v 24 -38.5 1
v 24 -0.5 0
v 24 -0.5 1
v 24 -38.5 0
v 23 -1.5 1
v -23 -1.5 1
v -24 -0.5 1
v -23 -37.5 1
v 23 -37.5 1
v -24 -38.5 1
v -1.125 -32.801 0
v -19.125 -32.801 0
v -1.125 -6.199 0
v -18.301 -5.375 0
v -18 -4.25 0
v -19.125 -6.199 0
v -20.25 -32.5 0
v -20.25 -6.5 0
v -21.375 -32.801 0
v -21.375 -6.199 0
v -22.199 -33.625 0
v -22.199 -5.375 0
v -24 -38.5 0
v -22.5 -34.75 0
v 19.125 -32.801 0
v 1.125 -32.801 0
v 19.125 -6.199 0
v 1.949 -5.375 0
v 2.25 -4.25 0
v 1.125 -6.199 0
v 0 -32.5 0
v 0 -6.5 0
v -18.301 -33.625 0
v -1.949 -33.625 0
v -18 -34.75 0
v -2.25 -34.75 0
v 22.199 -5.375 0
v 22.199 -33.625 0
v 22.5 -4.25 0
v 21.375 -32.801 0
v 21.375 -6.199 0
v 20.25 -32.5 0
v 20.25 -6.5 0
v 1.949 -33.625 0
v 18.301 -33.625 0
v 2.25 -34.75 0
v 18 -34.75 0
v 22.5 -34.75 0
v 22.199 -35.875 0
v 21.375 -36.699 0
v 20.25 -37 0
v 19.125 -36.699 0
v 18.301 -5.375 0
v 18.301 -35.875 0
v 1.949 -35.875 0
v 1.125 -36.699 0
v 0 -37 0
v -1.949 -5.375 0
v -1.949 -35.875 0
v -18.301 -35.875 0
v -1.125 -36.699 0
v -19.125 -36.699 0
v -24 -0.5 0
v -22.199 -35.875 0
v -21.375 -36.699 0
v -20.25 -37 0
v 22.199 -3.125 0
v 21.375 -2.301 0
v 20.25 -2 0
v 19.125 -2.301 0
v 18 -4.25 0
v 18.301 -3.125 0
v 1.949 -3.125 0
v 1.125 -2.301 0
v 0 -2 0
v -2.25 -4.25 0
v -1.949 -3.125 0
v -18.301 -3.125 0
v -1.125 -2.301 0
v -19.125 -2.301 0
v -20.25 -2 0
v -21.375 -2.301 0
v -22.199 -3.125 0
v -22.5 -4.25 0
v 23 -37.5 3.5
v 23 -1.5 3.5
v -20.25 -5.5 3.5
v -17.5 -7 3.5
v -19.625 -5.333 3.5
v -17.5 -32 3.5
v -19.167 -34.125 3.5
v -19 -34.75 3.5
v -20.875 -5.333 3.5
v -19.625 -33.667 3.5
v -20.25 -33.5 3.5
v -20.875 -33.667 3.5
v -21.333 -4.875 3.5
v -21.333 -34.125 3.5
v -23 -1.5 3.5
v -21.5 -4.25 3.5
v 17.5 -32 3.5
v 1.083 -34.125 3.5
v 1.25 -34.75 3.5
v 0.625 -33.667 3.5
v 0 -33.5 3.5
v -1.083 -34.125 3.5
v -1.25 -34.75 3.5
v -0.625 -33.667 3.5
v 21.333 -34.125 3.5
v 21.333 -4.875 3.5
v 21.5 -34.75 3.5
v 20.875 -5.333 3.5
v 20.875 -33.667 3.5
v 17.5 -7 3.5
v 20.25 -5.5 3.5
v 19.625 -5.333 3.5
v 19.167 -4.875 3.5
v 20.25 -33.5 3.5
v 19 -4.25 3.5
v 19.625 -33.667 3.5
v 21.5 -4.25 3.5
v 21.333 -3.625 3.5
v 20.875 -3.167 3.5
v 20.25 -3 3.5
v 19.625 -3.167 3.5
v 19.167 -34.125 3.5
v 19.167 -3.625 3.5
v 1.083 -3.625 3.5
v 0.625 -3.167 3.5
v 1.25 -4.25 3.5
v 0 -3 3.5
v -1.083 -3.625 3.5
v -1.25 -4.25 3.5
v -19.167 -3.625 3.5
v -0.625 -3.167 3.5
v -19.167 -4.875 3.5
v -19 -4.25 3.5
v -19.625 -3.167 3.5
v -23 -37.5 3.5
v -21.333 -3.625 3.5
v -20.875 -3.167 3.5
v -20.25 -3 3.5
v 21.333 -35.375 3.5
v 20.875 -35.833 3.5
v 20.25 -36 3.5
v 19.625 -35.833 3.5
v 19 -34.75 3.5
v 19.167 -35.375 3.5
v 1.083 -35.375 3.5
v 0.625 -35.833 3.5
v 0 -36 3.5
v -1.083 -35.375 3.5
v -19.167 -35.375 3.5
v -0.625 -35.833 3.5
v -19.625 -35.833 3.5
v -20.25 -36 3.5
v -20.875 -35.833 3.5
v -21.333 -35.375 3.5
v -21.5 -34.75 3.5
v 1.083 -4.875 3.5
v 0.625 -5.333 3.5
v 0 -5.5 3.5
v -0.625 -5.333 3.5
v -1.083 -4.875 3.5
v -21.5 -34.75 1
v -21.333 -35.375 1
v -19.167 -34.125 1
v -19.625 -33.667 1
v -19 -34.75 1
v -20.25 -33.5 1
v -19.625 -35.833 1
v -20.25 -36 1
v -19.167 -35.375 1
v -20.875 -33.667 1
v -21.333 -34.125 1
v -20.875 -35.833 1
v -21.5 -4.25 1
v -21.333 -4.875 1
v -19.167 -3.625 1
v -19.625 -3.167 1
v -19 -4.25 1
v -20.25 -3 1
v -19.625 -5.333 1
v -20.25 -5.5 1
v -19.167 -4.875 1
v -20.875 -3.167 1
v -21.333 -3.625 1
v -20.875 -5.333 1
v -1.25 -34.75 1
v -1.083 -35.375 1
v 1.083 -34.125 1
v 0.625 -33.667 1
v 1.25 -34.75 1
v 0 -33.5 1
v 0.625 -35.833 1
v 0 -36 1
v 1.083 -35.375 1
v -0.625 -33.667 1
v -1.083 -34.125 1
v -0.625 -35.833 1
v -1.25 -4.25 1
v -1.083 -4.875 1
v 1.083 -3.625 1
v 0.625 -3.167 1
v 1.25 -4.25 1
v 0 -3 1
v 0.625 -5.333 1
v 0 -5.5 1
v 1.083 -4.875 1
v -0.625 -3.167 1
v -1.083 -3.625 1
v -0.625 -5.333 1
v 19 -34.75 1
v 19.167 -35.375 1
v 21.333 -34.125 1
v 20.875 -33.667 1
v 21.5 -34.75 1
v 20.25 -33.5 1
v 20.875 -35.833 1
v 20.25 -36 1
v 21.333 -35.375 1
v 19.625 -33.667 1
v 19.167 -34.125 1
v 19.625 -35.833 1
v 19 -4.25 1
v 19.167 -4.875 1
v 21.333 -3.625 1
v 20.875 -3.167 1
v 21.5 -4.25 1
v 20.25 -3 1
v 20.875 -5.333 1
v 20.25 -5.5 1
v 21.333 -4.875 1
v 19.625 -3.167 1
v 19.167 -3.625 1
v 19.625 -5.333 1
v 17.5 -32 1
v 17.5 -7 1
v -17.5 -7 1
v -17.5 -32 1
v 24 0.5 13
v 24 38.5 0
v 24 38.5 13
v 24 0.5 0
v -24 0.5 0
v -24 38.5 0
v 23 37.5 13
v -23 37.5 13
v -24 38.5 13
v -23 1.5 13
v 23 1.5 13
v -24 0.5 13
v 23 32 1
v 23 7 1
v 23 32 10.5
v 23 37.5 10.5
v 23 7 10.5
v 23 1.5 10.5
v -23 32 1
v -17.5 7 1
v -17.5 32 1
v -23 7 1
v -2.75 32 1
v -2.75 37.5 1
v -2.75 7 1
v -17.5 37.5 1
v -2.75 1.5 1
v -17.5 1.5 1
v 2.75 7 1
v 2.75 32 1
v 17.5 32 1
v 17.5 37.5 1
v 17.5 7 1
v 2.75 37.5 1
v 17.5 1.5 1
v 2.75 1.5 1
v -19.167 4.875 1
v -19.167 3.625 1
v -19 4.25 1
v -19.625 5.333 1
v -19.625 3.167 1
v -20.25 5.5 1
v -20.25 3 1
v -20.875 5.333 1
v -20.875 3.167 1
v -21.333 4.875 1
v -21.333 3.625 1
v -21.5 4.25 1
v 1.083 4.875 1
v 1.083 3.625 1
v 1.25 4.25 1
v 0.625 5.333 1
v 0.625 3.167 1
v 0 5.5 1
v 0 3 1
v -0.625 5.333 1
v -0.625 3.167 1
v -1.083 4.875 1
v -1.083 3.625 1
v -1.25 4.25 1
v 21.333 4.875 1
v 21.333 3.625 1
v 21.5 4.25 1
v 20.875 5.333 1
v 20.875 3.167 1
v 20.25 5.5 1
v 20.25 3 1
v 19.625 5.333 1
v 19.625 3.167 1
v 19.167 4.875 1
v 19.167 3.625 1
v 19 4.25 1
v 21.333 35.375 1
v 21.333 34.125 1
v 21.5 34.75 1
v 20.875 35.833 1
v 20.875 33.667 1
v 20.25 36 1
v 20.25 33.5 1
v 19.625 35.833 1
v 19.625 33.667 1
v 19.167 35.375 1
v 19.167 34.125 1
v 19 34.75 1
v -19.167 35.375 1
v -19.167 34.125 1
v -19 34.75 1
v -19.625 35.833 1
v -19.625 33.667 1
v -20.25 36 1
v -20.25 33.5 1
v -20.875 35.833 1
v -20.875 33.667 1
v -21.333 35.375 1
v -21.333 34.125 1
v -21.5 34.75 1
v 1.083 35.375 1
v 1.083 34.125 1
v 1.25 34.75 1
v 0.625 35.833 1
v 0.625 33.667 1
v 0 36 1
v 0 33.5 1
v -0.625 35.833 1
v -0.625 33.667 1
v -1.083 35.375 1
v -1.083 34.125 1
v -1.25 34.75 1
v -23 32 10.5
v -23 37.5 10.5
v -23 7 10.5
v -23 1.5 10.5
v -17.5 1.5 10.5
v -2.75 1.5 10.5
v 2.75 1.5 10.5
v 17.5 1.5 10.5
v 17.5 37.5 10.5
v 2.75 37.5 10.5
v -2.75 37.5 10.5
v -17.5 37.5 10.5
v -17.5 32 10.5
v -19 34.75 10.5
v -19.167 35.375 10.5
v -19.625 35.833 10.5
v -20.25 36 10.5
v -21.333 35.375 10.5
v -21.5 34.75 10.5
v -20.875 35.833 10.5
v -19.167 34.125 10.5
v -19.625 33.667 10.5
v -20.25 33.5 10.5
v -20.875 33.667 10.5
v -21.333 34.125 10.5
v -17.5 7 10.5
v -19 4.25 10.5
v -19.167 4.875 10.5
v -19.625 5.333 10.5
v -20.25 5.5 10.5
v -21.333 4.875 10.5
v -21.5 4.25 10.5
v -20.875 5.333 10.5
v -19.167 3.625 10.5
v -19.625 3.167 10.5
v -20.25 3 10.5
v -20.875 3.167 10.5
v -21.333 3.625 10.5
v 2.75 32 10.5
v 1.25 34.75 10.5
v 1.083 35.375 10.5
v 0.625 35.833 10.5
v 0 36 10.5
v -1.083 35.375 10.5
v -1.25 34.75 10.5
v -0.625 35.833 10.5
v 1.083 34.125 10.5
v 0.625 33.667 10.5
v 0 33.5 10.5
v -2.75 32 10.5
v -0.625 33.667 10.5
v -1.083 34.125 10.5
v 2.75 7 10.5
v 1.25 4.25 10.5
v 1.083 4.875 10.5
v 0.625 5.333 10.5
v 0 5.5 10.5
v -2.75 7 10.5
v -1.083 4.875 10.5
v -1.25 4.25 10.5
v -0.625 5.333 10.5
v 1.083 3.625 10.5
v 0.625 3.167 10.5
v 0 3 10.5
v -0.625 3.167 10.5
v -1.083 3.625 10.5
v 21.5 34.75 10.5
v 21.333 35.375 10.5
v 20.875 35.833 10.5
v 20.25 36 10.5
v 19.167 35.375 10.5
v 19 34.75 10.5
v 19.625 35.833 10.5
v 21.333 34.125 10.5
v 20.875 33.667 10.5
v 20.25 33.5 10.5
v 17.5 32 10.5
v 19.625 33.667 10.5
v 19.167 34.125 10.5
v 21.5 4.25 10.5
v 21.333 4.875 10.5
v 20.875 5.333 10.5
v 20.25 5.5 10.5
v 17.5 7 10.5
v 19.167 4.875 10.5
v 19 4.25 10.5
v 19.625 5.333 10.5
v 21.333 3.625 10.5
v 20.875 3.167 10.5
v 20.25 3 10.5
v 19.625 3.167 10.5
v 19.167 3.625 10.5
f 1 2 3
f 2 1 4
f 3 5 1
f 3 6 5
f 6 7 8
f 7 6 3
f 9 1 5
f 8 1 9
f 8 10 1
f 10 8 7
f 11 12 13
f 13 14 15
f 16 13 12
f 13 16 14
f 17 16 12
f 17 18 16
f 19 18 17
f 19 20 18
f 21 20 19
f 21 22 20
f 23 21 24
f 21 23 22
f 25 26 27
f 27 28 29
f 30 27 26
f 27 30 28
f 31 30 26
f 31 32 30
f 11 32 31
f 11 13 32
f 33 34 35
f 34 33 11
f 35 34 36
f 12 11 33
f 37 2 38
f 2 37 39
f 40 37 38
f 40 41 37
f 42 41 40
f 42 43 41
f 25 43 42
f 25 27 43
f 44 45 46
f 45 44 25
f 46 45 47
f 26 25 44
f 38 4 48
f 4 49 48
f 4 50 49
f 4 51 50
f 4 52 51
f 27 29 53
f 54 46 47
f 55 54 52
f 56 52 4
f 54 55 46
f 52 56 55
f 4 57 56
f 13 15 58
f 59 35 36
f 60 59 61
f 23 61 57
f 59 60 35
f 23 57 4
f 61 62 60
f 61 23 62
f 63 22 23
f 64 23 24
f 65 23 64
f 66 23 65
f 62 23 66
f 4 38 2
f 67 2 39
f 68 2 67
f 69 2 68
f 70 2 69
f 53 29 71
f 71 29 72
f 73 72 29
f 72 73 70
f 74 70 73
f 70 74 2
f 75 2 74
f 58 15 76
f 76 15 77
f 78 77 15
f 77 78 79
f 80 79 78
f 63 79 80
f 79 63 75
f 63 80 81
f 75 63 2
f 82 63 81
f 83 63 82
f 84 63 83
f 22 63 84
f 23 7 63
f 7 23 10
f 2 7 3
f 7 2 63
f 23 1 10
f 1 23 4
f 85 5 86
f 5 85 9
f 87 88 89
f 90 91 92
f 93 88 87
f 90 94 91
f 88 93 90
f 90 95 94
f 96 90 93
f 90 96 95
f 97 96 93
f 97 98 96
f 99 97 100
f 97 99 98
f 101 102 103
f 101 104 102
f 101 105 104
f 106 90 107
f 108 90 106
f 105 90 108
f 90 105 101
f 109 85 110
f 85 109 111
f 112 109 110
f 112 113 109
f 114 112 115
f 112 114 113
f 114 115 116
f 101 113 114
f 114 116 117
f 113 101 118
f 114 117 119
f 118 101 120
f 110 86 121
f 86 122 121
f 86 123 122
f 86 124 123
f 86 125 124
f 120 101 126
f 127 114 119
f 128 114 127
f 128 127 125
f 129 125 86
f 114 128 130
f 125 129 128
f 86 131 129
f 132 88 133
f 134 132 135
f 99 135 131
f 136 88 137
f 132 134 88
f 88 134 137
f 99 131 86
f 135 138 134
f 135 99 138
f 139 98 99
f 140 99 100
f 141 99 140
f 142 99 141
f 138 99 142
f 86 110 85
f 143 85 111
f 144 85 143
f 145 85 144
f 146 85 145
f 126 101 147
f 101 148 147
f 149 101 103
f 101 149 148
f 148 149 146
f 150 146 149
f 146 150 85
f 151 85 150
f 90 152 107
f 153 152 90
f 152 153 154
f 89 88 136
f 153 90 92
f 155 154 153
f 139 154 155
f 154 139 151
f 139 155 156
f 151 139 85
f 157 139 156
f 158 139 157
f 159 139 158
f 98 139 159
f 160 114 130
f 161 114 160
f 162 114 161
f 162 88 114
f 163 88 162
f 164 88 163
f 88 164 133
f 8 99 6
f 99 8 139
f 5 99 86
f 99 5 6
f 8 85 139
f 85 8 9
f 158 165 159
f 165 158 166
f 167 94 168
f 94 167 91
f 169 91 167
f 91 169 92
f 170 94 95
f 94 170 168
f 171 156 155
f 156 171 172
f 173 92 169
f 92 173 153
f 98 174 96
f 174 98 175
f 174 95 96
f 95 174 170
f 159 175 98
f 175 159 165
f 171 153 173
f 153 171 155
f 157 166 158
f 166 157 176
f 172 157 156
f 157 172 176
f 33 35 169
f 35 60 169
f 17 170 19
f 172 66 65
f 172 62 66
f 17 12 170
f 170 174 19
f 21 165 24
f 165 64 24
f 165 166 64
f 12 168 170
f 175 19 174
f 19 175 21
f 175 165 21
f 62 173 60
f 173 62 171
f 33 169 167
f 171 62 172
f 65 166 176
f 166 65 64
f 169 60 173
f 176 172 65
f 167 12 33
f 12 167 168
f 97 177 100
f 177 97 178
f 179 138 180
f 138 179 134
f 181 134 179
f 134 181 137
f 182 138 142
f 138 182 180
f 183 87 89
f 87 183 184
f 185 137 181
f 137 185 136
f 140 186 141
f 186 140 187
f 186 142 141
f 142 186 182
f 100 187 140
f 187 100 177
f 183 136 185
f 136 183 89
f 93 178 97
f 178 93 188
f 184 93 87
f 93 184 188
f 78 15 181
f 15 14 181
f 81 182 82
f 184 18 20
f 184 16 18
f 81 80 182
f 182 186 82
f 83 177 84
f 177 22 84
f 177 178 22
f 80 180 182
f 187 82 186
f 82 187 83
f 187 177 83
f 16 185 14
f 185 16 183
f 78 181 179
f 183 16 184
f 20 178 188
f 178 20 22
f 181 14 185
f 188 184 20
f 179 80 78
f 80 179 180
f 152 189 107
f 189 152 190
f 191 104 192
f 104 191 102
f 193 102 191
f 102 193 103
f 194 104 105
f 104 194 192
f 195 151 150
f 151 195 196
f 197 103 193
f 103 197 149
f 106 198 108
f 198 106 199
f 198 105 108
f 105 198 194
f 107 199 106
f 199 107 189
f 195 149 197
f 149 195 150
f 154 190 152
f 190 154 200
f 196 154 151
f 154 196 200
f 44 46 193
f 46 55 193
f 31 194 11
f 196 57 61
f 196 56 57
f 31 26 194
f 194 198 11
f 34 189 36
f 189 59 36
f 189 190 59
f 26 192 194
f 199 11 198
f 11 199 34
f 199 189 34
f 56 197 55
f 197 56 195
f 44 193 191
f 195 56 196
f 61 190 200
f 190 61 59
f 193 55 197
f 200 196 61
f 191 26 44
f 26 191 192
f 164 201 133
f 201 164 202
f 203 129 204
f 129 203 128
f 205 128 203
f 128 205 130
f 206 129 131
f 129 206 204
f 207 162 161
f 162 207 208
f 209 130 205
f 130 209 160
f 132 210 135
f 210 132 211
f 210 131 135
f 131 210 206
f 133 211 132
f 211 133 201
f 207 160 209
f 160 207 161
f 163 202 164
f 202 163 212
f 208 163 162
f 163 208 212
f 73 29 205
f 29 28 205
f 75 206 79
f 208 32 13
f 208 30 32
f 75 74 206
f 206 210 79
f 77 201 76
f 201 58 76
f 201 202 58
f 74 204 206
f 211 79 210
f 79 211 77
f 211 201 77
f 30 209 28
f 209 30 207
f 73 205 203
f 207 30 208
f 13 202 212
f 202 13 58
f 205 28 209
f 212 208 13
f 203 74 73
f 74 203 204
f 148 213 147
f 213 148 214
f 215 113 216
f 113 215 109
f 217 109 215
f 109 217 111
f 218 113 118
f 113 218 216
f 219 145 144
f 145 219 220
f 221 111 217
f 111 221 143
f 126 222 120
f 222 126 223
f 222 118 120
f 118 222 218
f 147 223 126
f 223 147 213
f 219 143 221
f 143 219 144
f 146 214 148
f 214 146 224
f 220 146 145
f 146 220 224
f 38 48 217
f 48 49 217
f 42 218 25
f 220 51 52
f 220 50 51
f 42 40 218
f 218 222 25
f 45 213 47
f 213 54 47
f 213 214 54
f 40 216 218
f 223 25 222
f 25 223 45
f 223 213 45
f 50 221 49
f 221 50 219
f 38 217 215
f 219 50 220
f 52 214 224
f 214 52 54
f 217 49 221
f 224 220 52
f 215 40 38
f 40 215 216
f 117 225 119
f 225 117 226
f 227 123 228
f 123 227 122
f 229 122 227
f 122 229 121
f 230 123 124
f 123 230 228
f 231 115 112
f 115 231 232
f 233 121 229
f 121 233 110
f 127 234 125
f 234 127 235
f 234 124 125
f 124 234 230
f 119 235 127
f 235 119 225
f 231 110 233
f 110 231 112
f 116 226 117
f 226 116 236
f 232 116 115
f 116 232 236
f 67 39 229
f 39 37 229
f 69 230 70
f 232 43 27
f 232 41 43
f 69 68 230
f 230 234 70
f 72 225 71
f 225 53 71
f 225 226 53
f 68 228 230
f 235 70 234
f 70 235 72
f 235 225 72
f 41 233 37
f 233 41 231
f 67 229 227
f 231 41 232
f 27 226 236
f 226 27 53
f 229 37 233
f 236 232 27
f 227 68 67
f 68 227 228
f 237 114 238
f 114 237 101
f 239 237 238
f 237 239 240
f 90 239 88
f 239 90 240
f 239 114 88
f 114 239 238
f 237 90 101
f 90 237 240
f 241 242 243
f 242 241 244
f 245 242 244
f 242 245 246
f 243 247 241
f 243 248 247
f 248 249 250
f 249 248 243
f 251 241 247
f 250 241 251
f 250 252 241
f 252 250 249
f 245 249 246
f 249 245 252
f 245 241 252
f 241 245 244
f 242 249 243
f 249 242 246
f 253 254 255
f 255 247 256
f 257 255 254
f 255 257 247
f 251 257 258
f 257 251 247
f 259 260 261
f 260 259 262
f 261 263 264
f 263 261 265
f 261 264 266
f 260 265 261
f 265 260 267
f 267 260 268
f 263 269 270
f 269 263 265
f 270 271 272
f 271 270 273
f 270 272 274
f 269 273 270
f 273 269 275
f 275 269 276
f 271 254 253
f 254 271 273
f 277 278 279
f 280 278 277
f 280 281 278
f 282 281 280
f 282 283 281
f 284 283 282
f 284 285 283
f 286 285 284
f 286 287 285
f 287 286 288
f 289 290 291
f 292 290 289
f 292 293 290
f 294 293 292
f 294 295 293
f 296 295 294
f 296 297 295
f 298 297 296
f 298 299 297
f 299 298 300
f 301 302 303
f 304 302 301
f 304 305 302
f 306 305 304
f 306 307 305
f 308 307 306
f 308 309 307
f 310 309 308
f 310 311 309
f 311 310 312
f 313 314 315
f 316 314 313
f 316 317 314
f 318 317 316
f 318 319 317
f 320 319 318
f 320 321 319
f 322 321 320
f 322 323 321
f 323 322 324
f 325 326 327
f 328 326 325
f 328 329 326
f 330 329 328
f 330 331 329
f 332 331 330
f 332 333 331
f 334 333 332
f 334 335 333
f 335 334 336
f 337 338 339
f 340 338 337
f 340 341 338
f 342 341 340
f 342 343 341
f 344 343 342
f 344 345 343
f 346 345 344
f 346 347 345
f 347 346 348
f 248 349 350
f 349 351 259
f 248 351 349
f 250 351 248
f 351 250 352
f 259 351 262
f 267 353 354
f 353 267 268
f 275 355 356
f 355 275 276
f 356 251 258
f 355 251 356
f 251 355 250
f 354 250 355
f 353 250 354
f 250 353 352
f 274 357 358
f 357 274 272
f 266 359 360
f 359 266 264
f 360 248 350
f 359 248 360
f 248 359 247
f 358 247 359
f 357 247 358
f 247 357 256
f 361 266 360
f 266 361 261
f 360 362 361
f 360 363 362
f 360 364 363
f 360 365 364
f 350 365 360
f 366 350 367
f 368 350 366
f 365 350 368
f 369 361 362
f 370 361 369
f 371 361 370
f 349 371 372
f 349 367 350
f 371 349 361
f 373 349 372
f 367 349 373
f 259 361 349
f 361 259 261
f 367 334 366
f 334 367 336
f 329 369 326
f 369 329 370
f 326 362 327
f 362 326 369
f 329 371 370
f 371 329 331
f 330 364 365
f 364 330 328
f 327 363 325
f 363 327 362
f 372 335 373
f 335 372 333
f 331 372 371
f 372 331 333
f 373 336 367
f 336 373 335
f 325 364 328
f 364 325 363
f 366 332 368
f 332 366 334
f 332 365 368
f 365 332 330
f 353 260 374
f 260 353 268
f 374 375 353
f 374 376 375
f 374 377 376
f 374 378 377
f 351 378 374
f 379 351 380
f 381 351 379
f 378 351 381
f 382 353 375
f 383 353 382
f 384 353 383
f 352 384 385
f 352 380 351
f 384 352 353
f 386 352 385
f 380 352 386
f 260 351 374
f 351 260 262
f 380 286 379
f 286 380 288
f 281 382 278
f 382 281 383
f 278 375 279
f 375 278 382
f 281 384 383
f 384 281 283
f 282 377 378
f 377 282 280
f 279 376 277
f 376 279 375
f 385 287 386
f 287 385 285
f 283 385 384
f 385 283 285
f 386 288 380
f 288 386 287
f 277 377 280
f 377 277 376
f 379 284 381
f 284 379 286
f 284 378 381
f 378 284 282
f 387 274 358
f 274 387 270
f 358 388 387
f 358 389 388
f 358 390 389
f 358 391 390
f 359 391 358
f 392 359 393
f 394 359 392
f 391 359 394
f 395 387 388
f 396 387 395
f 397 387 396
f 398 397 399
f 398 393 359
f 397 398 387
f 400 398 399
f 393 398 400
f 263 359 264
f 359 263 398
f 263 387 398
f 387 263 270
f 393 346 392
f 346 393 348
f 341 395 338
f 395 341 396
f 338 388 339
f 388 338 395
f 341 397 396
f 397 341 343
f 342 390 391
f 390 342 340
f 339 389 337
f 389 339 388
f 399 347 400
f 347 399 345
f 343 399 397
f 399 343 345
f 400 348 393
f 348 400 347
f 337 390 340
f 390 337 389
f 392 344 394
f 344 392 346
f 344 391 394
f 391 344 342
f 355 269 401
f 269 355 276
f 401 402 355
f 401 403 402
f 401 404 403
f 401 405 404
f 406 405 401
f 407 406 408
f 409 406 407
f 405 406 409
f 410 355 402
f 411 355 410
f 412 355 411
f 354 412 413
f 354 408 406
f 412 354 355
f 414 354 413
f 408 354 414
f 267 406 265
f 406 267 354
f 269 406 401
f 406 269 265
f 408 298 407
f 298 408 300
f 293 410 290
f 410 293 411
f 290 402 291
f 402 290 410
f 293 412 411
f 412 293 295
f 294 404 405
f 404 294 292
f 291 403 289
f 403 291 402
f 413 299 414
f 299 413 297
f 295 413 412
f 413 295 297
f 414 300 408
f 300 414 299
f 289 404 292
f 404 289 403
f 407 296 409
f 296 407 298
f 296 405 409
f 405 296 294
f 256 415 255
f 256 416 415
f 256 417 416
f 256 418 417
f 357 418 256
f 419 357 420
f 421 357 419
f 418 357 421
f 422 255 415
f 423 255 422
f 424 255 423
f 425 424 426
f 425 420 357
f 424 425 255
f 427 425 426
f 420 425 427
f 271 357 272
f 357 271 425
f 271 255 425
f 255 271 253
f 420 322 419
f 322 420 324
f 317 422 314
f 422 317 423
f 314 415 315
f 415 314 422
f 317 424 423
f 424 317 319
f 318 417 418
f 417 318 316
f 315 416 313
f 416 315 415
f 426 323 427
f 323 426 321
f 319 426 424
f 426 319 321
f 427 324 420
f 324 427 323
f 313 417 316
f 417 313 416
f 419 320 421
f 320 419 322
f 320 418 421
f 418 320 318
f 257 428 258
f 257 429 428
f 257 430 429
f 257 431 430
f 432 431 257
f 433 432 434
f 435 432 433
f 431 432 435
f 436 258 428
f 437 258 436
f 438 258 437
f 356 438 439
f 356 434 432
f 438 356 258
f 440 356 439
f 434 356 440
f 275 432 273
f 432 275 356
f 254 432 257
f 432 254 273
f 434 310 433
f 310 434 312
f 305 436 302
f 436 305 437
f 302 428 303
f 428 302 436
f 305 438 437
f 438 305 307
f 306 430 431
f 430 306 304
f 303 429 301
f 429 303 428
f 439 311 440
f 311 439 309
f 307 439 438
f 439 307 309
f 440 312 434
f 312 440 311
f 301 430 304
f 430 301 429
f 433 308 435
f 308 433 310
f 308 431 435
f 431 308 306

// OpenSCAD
/**
 * Parametric Chassis - Version 001
 * ================================
 *
 * by Bernhard "HotKey" Slawik, http://www.bernhardslawik.de
 * Have fun! MakerBot FTW!
 *
 */

l = 35;		// Length (x-size) (Matchbox: 60)
w = 25;		// Width (y-size) (Matchbox: 36)
h = 12;		// Height (z-size) (Matchbox: 15; Recommendation add an extra mm for each 7.5mm)

wall = 1.0;			// Wall thickness [mm]
					//	1mm: (recommended)
					//		Floor: 3 solid layers
					//		Side : 2 layers, no filling

floorOverlap = 2.5;						// Overlapping of floor wall into top piece [mm] (Recommendation: > 2mm)

boltRadius = (3.0 / 2) - 0.25;			// Radius of bolts (bolt holes)
boltSlantExtraRadius = 0.75 + 0.25;		// Watch out! Don't make it too close to the outer walls! Leave ~1mm
boltSlantHeight = 1.0;					// Watch out! Keep the slant angle > 45 deg. (i.e. boltSlantHeight > boltSlantExtraRadius)

// Internals
boltWall = 1.5;							// Strength of bolt-surrounding (Recommendation: > 1mm)
boltIndent = boltRadius*2 + boltWall*2;	// Spacing for bolts and overlap [mm]

boltSides = 12;							// Number of sides for bolt holes
extra = 0.5;								// Extra overlap For boolean operations



boltPositions = [
	[-boltIndent/2, -boltIndent/2, 0],
	[-boltIndent/2, w + boltIndent/2, 0],
	
	[l/2, -boltIndent/2, 0],				// Comment out these two lines if you only want 4 bolts in the corners
	[l/2, w + boltIndent/2, 0],

	[l + boltIndent/2, -boltIndent/2, 0],
	[l + boltIndent/2, w + boltIndent/2, 0]
];


module chassis(l, w, h) {
	//cube([l, w, h]);
	s = w + boltIndent*2 + wall*2;

	translate([-l/2, -w/2, 0]) {


	// Generate TOP and BOTTOM at the same time

		// Floor
		translate([0, -(s/2 + extra), wall])		chassisFloor(l, w, h);

		// Top
		translate([0, w + (s/2 + extra), h + wall])
			rotate([180, 0, 0])
				chassisTop(l, w, h);

	// Generate parts separately
/*
		// Floor
		translate([0, 0, wall])		chassisFloor(l, w, h);
*/
/*
		// Top
		translate([0, w, h + wall])
			rotate([180, 0, 0])
				chassisTop(l, w, h);
*/


	}

}


module bolt(bh) {
	difference() {
		// Perfect cylinder wall
		//cylinder(r = boltRadius+boltWall, h = bh, $fn = boltSides);

		// Heavy cubic wall
		translate([-boltIndent/2, -boltIndent/2, 0]) {
			cube([boltIndent, boltIndent, bh]);
		}

		cylinder(r = boltRadius, h = bh, $fn = boltSides);
	}
}
module boltHole(bh) {
	union() {
		// Hole
		translate([0, 0, -extra]) {
			cylinder(r = boltRadius, h = bh + extra*2, $fn = boltSides);
		}

		// Slant
		cylinder(r1 = boltRadius+boltSlantExtraRadius, r2 = boltRadius, h = boltSlantHeight, $fn = boltSides);

	}
}

module chassisFloor(l, w, h) {
	difference() {
		union() {
			// Sub-Floor
			translate([-(wall + boltIndent), -(wall + boltIndent), -wall])
				cube([l + (wall + boltIndent)*2, w + (wall + boltIndent)*2, wall]);

			// Overlapping Block ("Bolt indent")
			translate([-boltIndent, -boltIndent, 0])
				cube([l + boltIndent*2, w + boltIndent*2, floorOverlap]);
		}

		// Minus...
		union() {
			// The space itself
			cube([l, w, floorOverlap + extra]);

/*
			// Thinnen it out
			translate([-(boltIndent - wall), 0, 0])
				cube([l + (boltIndent - wall)*2, w, floorOverlap + extra]);

			translate([0, -(boltIndent - wall), 0])
				cube([l, w + (boltIndent - wall)*2, floorOverlap + extra]);
*/

			// Bolt-Holes on floor plane
			translate([0, 0, -wall]) {
				for (p = boltPositions) {
					translate(p)
						boltHole(wall + floorOverlap);
				}
			}

		}
	}
}


module chassisTop(l, w, h) {
	union() {
		difference() {
			// Ewwrifing
			translate([-(wall + boltIndent), -(wall + boltIndent), 0])
				cube([l + (wall + boltIndent)*2, w + (wall + boltIndent)*2, h + wall]);

			// Inner
			translate([-boltIndent, -boltIndent, 0])
				cube([l + boltIndent*2, w + boltIndent*2, h]);
		}

		// Bolts in top part
		translate([0, 0, floorOverlap]) {
			for (p = boltPositions) {
				translate(p)
					bolt(h - floorOverlap);
			}
		}
	}
}



// Provide the INNER dimension of the box (the space YOU need). Real dimensions will be "plus 2x wall"
chassis(l, w, h);
